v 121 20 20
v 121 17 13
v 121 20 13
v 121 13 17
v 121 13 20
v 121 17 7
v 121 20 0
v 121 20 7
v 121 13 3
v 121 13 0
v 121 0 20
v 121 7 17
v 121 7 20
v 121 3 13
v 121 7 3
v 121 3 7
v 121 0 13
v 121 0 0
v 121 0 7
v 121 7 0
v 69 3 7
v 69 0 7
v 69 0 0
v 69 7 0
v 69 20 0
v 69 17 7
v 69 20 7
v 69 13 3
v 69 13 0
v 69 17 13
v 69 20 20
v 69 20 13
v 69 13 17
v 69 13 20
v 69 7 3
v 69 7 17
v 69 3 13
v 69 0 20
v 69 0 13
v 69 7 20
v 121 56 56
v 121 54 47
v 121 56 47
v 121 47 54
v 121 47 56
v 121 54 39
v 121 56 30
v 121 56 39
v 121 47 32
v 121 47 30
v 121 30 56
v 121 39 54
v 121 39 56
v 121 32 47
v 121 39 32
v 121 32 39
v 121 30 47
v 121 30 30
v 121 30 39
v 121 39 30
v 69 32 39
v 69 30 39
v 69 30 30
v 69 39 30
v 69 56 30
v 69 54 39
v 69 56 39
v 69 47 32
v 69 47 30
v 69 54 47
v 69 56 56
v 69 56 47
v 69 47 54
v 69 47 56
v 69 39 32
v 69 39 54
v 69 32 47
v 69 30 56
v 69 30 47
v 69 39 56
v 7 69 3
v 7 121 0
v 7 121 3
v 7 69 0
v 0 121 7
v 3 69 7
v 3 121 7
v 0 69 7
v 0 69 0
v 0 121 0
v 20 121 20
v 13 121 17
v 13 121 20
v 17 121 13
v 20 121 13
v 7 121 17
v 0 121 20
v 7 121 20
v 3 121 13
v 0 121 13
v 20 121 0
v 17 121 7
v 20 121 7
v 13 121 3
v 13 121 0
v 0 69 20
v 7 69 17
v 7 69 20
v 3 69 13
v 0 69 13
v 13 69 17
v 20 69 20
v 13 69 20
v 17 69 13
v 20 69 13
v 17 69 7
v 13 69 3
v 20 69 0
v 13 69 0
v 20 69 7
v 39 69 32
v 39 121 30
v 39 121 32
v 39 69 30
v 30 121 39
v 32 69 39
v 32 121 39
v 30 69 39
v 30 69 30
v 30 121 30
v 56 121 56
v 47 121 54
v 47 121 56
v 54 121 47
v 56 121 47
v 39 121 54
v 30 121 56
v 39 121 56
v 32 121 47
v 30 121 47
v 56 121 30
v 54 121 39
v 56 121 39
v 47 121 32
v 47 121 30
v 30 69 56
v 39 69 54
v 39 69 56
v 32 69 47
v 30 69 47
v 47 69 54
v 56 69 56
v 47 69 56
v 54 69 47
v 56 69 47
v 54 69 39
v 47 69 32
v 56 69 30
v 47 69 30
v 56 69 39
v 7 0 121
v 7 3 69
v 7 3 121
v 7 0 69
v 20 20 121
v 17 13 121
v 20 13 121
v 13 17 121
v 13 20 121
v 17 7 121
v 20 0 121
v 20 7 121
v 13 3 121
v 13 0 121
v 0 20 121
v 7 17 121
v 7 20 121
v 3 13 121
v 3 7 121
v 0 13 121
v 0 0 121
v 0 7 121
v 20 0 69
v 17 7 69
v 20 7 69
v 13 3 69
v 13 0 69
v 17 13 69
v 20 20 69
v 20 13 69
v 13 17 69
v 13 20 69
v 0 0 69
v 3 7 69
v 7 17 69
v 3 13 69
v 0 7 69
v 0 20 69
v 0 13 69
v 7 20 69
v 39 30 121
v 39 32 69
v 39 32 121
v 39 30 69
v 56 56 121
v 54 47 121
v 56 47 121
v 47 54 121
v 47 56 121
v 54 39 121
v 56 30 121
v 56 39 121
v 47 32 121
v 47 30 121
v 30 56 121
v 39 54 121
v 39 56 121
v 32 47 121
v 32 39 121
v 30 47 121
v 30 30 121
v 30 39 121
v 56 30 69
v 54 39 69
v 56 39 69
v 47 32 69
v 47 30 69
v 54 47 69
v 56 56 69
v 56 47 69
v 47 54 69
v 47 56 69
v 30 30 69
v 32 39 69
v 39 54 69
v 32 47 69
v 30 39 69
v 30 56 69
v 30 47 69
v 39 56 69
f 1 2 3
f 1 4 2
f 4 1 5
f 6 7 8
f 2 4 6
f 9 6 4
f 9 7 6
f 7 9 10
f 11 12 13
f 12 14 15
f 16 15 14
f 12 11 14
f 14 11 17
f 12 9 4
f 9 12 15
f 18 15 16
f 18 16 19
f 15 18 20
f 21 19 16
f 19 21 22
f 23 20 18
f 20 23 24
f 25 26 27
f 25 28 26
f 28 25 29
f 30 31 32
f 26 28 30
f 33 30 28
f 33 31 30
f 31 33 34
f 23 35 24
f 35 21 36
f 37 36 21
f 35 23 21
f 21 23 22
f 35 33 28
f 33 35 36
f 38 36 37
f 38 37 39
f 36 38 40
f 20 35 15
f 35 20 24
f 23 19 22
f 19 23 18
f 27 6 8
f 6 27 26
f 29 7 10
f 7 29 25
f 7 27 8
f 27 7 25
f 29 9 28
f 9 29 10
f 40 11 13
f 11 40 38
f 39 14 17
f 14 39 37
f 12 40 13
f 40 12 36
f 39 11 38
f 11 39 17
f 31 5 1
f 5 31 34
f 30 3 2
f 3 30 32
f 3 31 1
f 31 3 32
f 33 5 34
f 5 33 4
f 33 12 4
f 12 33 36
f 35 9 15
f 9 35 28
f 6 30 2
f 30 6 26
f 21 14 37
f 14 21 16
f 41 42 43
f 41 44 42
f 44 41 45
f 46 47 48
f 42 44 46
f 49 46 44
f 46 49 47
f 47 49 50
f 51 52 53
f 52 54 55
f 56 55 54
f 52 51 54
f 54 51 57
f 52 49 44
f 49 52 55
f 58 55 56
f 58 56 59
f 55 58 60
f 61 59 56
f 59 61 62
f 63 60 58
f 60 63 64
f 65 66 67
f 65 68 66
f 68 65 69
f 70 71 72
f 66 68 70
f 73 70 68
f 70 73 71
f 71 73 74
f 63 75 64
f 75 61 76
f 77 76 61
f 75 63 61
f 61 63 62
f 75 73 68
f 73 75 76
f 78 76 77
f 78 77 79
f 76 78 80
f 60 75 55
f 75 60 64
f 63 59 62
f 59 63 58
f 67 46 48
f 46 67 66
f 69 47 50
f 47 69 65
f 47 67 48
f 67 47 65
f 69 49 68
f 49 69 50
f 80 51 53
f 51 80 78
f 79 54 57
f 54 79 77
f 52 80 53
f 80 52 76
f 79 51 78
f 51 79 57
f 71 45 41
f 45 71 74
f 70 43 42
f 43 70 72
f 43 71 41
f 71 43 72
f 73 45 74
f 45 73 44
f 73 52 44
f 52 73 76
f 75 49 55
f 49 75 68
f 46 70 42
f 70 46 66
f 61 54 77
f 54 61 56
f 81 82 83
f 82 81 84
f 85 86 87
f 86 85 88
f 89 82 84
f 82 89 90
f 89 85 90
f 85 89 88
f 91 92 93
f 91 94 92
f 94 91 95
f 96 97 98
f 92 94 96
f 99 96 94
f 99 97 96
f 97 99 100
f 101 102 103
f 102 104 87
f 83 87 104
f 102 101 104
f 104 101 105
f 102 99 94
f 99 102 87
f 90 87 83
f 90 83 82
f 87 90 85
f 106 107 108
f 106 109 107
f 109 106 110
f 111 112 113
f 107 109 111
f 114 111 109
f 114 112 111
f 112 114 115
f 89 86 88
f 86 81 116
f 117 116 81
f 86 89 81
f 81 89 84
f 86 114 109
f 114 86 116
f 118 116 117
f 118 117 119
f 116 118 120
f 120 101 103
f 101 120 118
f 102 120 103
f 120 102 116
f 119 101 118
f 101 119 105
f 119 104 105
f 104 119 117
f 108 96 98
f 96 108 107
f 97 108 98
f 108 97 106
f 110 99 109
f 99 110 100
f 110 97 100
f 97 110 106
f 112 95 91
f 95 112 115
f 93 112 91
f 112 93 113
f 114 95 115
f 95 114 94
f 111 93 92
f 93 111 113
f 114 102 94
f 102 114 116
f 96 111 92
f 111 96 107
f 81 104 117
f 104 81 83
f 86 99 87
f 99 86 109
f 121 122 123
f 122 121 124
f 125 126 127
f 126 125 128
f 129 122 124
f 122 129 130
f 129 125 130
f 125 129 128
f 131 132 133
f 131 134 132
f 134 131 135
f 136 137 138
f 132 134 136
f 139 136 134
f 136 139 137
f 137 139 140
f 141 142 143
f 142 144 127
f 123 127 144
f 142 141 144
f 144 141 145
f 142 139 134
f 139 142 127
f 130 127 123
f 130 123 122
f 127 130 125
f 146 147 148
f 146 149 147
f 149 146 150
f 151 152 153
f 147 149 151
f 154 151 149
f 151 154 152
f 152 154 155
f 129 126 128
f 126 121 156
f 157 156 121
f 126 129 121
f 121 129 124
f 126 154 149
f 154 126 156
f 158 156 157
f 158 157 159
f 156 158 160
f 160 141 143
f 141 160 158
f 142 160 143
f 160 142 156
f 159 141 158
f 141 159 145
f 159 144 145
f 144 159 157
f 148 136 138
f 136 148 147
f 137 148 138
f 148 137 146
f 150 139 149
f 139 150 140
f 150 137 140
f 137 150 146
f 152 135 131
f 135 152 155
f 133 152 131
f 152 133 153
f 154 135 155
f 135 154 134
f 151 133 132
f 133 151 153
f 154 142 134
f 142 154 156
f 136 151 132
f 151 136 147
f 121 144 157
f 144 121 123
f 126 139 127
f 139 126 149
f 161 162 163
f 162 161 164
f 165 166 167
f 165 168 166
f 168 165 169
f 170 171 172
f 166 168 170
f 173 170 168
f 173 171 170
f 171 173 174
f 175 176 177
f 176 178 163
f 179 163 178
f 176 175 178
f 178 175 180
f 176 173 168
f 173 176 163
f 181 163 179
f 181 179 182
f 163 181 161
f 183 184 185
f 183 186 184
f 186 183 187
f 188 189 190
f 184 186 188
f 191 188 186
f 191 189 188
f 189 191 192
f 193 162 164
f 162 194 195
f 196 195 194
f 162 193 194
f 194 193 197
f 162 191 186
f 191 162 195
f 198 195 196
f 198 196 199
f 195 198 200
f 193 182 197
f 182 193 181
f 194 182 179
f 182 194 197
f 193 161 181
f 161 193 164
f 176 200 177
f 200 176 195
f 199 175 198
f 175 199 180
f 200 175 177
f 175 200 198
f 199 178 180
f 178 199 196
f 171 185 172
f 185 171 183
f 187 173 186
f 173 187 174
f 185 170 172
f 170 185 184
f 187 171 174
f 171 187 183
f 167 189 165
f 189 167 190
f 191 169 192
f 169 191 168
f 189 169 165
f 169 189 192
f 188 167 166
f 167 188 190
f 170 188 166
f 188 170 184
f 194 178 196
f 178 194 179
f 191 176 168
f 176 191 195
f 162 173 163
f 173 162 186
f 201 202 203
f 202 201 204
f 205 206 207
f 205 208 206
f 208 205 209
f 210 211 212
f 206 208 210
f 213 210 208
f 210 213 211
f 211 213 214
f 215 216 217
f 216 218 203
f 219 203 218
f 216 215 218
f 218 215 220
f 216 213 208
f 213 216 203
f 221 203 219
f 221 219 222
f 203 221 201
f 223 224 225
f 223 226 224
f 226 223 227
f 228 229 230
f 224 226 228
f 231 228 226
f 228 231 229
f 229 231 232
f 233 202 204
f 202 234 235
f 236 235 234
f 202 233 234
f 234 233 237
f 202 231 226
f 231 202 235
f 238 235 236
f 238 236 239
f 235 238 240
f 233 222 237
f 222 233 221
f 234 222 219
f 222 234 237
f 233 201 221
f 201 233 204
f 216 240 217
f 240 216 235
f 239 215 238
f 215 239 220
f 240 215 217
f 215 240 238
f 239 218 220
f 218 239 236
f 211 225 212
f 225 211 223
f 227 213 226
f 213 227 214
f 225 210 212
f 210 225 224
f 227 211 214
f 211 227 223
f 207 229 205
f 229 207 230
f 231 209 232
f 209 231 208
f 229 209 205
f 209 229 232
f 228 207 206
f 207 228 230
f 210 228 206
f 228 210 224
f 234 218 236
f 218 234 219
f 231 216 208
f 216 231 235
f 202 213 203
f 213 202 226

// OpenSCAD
// file: modules_coin_0_2.scad
module tube_profile_X(x, y, z, longueur, epaisseur_bloc = 3, largeur_bloc = 6, largeur_profile = 20)
{
    ecart = (largeur_profile - largeur_bloc)/2;
    
    translate([x-1,y,z])
    #cube([longueur+2,ecart,ecart]);
    
    translate([x-1,y+ecart+largeur_bloc,z])
    #cube([longueur+2,ecart,ecart]);
    
    translate([x-1,y,z+ecart+largeur_bloc])
    #cube([longueur+2,ecart,ecart]);
    
    translate([x-1,y+ecart+largeur_bloc,z+ecart+largeur_bloc])
    #cube([longueur+2,ecart,ecart]);
    
    translate([x-1,y+epaisseur_bloc,z+epaisseur_bloc])
    #cube([longueur+2,largeur_profile-2*epaisseur_bloc,largeur_profile-2*epaisseur_bloc]);
}

module tube_profile_Y(x, y, z, longueur, epaisseur_bloc = 3, largeur_bloc = 6, largeur_profile = 20)
{
    ecart = (largeur_profile - largeur_bloc)/2;

    translate([x,y-1,z])
    #cube([ecart,longueur+2,ecart]);
    
    translate([x+ecart+largeur_bloc,y-1,z])
    #cube([ecart,longueur+2,ecart]);
    
    translate([x,y-1,z+ecart+largeur_bloc])
    #cube([ecart,longueur+2,ecart]);
    
    translate([x+ecart+largeur_bloc,y-1,z+ecart+largeur_bloc])
    #cube([ecart,longueur+2,ecart]);
    
    translate([x+epaisseur_bloc,y-1,z+epaisseur_bloc])
    #cube([largeur_profile-2*epaisseur_bloc,longueur+2,largeur_profile-2*epaisseur_bloc]);
}

module tube_profile_Z(x, y, z, longueur, epaisseur = 3, epaisseur_bloc = 3, largeur_bloc = 6, largeur_profile = 20)
{
    ecart = (largeur_profile - largeur_bloc)/2;

    translate([x,y,z-1])
    #cube([ecart,ecart,longueur+2]);
    
    translate([x,y+ecart+largeur_bloc,z-1])
    #cube([ecart,ecart,longueur+2]);
    
    translate([x+ecart+largeur_bloc,y,z-1])
    #cube([ecart,ecart,longueur+2]);
    
    translate([x+ecart+largeur_bloc,y+ecart+largeur_bloc,z-1])
    #cube([ecart,ecart,longueur+2]);
    
    translate([x+epaisseur_bloc,y+epaisseur_bloc,z-1])
    #cube([largeur_profile-2*epaisseur_bloc,largeur_profile-2*epaisseur_bloc,longueur+2]);
}
// main file
include <modules_coin_0_2.scad>

tube_profile_X(70,0,0,50);
tube_profile_X(x=70,y=30,z=30,longueur=50,epaisseur_bloc=2,largeur_bloc=8,largeur_profile=26);

tube_profile_Y(0,70,0,50);
tube_profile_Y(x=30,y=70,z=30,longueur=50,epaisseur_bloc=2,largeur_bloc=8,largeur_profile=26);

tube_profile_Z(0,0,70,50);
tube_profile_Z(x=30,y=30,z=70,longueur=50,epaisseur_bloc=2,largeur_bloc=8,largeur_profile=26);
